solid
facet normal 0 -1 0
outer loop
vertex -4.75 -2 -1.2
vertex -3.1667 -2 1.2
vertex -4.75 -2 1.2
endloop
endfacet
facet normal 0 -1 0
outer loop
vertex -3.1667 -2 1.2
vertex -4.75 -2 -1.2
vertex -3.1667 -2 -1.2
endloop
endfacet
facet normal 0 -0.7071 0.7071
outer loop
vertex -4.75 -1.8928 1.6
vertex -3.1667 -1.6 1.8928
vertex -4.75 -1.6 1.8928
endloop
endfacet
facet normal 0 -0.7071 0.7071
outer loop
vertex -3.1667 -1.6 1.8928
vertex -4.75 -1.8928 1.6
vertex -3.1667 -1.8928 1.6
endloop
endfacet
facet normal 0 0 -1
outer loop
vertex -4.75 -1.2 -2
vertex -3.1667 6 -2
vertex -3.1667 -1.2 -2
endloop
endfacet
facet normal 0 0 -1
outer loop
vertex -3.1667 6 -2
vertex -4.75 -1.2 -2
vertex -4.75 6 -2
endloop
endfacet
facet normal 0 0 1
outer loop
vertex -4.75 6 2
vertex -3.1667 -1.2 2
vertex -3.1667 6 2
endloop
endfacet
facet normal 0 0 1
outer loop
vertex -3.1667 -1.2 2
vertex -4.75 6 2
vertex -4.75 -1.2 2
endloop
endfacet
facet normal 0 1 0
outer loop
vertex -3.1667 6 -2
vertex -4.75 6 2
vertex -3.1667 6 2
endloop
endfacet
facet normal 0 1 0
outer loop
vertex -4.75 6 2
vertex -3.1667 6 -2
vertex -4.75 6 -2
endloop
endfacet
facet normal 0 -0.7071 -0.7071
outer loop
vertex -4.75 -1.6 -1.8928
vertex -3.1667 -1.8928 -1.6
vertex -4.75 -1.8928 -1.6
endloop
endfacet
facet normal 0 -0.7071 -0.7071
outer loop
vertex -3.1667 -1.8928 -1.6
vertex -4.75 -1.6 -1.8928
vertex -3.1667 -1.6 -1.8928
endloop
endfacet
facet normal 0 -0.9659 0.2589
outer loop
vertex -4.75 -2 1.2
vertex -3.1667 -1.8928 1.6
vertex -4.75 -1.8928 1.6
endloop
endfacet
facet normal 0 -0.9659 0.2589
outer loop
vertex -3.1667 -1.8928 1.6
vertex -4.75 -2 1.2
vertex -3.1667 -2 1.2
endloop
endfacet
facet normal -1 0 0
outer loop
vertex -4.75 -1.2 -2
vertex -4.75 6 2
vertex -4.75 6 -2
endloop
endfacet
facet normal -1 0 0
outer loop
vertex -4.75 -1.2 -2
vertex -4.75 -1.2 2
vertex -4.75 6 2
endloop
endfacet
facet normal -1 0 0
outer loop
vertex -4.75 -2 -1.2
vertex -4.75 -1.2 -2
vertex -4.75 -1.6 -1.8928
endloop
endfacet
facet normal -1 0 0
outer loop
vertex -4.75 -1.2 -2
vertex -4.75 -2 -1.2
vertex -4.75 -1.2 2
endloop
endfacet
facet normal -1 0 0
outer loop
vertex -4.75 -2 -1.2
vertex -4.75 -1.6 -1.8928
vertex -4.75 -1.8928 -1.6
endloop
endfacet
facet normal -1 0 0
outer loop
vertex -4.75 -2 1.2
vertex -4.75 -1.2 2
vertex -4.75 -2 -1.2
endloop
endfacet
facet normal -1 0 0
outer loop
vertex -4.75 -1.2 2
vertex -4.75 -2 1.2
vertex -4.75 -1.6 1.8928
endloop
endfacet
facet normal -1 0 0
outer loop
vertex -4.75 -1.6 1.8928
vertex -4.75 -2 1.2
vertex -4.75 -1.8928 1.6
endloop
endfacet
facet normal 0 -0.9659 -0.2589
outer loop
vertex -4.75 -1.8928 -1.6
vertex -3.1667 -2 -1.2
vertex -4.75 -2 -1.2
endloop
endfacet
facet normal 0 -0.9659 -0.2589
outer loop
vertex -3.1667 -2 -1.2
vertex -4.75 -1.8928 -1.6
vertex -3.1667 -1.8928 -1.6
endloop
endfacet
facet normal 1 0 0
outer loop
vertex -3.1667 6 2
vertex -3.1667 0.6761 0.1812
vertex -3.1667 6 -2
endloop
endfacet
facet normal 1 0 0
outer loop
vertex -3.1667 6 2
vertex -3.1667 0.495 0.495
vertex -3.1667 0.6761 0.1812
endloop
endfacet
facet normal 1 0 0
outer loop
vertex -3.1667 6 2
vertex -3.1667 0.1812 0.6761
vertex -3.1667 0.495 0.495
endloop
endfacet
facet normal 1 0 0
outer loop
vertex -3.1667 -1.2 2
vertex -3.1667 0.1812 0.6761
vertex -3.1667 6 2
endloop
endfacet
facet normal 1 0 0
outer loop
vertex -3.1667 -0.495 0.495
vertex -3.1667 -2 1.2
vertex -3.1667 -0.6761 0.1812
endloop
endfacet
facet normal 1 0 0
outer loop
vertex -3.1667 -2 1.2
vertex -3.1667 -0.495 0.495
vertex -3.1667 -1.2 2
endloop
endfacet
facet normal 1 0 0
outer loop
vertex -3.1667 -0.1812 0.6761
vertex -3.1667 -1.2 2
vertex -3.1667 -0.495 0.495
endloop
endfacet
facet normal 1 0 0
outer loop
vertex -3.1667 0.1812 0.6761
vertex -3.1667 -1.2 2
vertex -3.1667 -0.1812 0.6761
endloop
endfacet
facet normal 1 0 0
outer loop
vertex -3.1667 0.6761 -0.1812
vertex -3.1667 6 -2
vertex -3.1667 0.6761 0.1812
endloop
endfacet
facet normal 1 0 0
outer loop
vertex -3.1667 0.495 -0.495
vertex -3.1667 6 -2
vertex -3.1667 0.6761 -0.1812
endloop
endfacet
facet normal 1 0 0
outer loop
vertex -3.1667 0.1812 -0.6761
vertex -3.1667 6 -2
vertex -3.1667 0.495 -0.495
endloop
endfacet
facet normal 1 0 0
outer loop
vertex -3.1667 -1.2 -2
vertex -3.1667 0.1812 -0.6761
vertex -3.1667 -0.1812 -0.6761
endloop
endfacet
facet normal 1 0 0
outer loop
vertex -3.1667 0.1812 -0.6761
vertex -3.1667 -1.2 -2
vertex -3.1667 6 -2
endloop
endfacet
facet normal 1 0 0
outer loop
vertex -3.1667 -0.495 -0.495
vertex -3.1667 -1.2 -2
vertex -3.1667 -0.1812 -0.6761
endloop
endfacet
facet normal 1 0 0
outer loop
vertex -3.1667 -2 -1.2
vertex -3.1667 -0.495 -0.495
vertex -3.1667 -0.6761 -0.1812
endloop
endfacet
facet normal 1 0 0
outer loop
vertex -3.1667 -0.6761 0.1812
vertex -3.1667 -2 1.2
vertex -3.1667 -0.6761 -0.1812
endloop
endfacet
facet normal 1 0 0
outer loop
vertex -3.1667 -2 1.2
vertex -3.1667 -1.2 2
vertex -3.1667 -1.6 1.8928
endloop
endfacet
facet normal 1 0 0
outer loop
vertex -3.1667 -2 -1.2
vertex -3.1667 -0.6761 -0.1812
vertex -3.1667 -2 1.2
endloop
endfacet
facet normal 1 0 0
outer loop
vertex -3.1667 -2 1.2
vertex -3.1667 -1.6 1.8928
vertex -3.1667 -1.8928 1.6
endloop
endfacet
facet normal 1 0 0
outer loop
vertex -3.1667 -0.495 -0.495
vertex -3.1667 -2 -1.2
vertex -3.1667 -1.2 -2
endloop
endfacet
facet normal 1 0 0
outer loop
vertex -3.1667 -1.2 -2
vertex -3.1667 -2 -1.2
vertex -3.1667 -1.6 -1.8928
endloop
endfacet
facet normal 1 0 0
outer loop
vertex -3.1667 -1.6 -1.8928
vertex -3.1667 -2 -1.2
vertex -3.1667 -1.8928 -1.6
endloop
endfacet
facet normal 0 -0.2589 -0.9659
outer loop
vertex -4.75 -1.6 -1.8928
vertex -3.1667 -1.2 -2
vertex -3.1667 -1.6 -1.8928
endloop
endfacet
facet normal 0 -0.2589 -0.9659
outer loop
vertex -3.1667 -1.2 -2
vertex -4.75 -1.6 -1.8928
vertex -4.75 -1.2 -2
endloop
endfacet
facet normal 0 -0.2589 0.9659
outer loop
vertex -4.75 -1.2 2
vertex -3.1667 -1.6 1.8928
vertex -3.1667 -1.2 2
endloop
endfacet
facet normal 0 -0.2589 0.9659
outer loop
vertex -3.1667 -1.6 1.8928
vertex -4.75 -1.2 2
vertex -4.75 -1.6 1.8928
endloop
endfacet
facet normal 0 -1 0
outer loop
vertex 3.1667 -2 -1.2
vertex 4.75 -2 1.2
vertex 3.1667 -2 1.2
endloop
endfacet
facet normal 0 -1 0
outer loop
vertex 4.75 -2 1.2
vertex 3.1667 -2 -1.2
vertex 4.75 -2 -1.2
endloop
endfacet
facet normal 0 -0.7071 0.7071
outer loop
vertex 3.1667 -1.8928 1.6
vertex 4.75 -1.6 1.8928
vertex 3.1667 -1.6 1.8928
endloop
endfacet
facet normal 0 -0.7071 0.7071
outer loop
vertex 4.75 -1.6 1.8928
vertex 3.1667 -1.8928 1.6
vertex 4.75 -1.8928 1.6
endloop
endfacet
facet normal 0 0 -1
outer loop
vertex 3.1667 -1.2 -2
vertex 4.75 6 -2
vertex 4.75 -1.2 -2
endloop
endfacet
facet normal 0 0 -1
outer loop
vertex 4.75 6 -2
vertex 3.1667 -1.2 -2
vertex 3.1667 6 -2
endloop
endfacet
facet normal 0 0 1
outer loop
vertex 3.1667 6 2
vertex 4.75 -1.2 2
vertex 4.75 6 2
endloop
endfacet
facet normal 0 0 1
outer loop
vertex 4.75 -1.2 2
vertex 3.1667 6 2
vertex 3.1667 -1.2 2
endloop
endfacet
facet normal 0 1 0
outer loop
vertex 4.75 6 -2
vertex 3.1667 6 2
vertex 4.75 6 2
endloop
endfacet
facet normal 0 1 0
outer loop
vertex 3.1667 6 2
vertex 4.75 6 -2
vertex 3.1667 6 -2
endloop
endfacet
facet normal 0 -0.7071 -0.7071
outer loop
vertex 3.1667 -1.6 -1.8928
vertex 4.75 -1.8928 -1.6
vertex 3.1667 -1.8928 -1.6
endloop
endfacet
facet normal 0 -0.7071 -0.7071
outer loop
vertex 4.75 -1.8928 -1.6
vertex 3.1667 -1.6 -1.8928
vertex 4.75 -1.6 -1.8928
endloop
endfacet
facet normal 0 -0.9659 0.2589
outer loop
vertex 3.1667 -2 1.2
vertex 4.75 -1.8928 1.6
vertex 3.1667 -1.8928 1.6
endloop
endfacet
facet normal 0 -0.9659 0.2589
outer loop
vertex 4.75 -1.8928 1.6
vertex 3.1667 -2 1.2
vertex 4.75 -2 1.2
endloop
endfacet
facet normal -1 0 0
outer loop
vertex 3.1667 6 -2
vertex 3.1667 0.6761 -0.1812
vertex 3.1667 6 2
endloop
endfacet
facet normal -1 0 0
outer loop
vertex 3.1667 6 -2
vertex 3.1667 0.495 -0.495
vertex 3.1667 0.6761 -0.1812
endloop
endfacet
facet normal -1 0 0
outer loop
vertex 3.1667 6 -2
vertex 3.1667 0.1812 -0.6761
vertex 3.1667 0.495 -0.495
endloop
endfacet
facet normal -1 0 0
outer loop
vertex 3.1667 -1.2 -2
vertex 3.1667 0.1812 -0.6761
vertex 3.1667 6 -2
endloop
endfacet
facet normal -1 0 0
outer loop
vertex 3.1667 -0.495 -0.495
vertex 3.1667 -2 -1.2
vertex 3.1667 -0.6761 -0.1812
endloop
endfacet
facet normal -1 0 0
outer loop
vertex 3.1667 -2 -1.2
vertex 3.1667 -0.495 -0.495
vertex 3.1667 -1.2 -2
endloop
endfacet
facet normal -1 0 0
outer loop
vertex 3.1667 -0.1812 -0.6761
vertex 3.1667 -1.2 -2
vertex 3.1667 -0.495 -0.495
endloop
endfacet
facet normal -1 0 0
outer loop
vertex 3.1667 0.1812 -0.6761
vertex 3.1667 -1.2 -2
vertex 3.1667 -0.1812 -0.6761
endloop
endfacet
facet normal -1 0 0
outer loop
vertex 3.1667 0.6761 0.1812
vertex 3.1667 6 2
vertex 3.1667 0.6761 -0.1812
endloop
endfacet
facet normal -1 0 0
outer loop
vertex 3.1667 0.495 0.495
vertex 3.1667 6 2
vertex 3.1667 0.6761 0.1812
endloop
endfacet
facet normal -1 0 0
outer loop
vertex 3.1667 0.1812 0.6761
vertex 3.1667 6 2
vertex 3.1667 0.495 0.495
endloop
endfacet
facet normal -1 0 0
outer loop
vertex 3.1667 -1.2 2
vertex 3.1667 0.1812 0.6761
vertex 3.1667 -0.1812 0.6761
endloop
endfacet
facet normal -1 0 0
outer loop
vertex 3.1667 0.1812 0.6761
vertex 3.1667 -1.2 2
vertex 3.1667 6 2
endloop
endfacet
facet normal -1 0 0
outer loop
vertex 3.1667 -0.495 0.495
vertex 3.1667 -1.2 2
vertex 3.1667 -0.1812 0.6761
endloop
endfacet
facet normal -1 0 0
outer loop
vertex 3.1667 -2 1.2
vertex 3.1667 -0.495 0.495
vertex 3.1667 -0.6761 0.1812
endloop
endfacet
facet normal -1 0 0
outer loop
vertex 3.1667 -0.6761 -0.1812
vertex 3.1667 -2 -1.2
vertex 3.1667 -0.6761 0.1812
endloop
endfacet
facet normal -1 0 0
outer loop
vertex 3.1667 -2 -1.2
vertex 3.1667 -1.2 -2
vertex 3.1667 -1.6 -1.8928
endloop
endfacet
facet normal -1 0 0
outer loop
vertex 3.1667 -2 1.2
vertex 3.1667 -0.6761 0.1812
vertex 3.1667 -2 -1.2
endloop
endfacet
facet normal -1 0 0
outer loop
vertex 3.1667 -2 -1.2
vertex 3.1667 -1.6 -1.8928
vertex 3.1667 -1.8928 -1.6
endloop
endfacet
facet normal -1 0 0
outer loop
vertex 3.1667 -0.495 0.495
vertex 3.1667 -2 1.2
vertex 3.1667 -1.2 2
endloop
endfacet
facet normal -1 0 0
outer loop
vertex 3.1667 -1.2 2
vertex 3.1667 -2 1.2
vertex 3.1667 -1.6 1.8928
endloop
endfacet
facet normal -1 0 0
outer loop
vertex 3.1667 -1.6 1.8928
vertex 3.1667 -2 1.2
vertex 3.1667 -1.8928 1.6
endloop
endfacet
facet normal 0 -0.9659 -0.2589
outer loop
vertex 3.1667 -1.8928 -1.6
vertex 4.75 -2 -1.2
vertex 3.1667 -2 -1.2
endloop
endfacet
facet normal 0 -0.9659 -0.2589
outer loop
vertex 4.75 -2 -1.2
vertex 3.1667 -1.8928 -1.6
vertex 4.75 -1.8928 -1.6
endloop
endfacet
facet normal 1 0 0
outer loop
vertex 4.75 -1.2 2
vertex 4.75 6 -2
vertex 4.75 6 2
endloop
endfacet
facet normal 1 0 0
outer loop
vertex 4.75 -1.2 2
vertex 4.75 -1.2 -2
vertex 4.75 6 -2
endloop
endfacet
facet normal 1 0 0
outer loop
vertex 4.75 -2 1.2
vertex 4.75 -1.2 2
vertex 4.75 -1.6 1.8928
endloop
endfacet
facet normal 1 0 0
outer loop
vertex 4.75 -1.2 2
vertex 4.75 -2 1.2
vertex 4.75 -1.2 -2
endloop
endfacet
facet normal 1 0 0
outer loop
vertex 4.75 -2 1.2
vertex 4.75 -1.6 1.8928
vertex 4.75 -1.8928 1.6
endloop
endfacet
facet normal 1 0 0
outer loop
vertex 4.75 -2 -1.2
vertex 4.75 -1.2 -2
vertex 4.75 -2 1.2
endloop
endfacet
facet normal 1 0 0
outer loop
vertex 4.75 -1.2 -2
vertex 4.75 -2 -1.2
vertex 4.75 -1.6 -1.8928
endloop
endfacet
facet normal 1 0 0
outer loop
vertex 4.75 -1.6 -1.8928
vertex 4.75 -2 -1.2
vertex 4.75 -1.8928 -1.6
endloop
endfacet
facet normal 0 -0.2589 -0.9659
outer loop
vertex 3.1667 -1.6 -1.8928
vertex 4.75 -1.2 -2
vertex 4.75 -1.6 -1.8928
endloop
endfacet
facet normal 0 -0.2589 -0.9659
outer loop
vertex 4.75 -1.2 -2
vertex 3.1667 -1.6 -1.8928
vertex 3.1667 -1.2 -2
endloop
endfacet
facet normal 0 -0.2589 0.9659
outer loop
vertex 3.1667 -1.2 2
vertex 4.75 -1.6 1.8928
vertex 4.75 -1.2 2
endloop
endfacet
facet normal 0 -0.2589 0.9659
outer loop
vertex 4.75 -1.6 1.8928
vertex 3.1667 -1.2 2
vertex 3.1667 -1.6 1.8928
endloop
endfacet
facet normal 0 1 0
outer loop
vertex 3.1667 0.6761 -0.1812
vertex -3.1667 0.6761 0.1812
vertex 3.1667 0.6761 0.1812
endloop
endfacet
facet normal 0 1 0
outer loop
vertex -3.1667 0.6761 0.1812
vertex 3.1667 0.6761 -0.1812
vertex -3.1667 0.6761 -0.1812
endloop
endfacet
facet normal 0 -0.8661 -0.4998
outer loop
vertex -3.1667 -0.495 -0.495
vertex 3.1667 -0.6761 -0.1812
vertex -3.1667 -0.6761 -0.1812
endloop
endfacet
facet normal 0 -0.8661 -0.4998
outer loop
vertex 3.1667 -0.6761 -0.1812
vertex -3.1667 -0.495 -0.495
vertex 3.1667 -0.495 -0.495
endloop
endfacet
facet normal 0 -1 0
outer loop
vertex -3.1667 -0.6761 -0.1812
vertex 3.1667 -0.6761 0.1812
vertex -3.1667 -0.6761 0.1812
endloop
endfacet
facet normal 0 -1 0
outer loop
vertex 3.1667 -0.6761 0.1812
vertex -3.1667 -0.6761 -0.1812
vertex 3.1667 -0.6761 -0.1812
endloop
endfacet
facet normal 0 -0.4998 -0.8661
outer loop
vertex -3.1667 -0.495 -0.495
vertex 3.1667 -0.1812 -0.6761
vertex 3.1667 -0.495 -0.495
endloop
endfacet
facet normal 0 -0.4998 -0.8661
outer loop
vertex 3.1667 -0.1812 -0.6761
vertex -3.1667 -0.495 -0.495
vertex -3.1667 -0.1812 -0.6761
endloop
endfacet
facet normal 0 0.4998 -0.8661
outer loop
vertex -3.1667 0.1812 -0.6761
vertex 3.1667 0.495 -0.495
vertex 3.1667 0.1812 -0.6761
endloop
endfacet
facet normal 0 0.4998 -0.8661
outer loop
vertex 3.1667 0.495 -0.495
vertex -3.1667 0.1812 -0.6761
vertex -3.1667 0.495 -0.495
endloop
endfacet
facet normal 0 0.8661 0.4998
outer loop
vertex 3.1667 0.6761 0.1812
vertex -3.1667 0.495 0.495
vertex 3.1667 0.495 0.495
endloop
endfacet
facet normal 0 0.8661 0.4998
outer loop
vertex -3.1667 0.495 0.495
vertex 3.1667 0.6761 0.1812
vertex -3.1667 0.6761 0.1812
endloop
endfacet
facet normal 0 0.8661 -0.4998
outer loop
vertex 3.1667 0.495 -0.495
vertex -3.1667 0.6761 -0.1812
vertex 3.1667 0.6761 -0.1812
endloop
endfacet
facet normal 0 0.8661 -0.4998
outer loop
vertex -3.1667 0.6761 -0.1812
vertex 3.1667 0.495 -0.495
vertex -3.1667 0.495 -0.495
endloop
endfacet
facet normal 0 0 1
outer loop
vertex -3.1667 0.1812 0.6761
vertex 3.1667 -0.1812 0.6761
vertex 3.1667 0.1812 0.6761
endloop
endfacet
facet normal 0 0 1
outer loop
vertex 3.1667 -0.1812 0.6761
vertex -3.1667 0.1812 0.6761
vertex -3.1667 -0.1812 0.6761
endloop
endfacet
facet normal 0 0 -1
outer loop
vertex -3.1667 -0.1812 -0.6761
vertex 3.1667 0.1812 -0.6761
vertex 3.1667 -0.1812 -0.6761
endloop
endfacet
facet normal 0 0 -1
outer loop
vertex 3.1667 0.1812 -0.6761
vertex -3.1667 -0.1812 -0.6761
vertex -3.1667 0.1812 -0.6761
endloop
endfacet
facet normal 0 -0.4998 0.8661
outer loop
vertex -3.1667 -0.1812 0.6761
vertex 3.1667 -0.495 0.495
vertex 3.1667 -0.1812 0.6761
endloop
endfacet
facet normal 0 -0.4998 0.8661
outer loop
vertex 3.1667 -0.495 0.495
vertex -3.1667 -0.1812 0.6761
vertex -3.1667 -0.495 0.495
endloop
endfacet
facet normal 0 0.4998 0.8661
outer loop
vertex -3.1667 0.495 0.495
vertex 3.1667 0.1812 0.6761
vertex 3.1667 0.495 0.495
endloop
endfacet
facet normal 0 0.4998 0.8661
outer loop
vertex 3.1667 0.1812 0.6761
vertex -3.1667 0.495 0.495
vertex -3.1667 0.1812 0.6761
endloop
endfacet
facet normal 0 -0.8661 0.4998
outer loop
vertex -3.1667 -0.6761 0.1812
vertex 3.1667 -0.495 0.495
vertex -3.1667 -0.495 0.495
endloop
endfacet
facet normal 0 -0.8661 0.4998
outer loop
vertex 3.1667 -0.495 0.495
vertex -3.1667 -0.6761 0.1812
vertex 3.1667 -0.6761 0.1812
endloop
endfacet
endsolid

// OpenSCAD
// file: vars.scad
$fn = 12;
COLOR = "LimeGreen"; // Model color
TRIANGLE_SIDE = 40; // Triangle side size
TRIANGLE_THICKNESS = 4; // Triagle thickness
JOINT_WIDTH = TRIANGLE_SIDE/4; // Max width for clip/hinge
JOINT_TOLLERANCE = 0.5; // Fixed joint tollerance
// main file
include <vars.scad>;

FACE_ANGLE = 360/$fn;

module hinge(){
  width = JOINT_WIDTH-JOINT_TOLLERANCE;
  size = TRIANGLE_THICKNESS;
  side = width/6;
  corner = 0.8;
  
  echo("hinge widths (all, side, cylinder):", width, side, width-side*2);
    
  hull() {
    translate([-(width/2)+side/2, size, 0]) {
      cube([side, size, size], center=true);
    }
    translate([-(width/2)+side/2, -size/2+corner, size/2-corner]) {
      rotate(90, [0, 1, 0]) {
        cylinder(h=side, r=corner, center=true);
      }
    }
    translate([-(width/2)+side/2, -size/2+corner, -size/2+corner]) {
      rotate(90, [0, 1, 0]) {
        cylinder(h=side, r=corner, center=true);
      }
    }
  }
  hull() {
    translate([width/2-side/2, size, 0]) {
      cube([side, size, size], center=true);
    } 
    translate([width/2-side/2, -size/2+corner, size/2-corner]) {
      rotate(90, [0, 1, 0]) {
        cylinder(h=side, r=corner, center=true);
      }
    }
    translate([width/2-side/2, -size/2+corner, -size/2+corner]) {
      rotate(90, [0, 1, 0]) {
        cylinder(h=side, r=corner, center=true);
      }
    }
  }
  rotate(FACE_ANGLE/2, [1, 0, 0]) { // Required so that cylinder face is parallel to plane
    rotate(90, [0, 1, 0]) {
      cylinder(h=width, r=size/2*0.7/2, center=true);
    }
  }
} 

color(COLOR, 1) {
  hinge();
}
